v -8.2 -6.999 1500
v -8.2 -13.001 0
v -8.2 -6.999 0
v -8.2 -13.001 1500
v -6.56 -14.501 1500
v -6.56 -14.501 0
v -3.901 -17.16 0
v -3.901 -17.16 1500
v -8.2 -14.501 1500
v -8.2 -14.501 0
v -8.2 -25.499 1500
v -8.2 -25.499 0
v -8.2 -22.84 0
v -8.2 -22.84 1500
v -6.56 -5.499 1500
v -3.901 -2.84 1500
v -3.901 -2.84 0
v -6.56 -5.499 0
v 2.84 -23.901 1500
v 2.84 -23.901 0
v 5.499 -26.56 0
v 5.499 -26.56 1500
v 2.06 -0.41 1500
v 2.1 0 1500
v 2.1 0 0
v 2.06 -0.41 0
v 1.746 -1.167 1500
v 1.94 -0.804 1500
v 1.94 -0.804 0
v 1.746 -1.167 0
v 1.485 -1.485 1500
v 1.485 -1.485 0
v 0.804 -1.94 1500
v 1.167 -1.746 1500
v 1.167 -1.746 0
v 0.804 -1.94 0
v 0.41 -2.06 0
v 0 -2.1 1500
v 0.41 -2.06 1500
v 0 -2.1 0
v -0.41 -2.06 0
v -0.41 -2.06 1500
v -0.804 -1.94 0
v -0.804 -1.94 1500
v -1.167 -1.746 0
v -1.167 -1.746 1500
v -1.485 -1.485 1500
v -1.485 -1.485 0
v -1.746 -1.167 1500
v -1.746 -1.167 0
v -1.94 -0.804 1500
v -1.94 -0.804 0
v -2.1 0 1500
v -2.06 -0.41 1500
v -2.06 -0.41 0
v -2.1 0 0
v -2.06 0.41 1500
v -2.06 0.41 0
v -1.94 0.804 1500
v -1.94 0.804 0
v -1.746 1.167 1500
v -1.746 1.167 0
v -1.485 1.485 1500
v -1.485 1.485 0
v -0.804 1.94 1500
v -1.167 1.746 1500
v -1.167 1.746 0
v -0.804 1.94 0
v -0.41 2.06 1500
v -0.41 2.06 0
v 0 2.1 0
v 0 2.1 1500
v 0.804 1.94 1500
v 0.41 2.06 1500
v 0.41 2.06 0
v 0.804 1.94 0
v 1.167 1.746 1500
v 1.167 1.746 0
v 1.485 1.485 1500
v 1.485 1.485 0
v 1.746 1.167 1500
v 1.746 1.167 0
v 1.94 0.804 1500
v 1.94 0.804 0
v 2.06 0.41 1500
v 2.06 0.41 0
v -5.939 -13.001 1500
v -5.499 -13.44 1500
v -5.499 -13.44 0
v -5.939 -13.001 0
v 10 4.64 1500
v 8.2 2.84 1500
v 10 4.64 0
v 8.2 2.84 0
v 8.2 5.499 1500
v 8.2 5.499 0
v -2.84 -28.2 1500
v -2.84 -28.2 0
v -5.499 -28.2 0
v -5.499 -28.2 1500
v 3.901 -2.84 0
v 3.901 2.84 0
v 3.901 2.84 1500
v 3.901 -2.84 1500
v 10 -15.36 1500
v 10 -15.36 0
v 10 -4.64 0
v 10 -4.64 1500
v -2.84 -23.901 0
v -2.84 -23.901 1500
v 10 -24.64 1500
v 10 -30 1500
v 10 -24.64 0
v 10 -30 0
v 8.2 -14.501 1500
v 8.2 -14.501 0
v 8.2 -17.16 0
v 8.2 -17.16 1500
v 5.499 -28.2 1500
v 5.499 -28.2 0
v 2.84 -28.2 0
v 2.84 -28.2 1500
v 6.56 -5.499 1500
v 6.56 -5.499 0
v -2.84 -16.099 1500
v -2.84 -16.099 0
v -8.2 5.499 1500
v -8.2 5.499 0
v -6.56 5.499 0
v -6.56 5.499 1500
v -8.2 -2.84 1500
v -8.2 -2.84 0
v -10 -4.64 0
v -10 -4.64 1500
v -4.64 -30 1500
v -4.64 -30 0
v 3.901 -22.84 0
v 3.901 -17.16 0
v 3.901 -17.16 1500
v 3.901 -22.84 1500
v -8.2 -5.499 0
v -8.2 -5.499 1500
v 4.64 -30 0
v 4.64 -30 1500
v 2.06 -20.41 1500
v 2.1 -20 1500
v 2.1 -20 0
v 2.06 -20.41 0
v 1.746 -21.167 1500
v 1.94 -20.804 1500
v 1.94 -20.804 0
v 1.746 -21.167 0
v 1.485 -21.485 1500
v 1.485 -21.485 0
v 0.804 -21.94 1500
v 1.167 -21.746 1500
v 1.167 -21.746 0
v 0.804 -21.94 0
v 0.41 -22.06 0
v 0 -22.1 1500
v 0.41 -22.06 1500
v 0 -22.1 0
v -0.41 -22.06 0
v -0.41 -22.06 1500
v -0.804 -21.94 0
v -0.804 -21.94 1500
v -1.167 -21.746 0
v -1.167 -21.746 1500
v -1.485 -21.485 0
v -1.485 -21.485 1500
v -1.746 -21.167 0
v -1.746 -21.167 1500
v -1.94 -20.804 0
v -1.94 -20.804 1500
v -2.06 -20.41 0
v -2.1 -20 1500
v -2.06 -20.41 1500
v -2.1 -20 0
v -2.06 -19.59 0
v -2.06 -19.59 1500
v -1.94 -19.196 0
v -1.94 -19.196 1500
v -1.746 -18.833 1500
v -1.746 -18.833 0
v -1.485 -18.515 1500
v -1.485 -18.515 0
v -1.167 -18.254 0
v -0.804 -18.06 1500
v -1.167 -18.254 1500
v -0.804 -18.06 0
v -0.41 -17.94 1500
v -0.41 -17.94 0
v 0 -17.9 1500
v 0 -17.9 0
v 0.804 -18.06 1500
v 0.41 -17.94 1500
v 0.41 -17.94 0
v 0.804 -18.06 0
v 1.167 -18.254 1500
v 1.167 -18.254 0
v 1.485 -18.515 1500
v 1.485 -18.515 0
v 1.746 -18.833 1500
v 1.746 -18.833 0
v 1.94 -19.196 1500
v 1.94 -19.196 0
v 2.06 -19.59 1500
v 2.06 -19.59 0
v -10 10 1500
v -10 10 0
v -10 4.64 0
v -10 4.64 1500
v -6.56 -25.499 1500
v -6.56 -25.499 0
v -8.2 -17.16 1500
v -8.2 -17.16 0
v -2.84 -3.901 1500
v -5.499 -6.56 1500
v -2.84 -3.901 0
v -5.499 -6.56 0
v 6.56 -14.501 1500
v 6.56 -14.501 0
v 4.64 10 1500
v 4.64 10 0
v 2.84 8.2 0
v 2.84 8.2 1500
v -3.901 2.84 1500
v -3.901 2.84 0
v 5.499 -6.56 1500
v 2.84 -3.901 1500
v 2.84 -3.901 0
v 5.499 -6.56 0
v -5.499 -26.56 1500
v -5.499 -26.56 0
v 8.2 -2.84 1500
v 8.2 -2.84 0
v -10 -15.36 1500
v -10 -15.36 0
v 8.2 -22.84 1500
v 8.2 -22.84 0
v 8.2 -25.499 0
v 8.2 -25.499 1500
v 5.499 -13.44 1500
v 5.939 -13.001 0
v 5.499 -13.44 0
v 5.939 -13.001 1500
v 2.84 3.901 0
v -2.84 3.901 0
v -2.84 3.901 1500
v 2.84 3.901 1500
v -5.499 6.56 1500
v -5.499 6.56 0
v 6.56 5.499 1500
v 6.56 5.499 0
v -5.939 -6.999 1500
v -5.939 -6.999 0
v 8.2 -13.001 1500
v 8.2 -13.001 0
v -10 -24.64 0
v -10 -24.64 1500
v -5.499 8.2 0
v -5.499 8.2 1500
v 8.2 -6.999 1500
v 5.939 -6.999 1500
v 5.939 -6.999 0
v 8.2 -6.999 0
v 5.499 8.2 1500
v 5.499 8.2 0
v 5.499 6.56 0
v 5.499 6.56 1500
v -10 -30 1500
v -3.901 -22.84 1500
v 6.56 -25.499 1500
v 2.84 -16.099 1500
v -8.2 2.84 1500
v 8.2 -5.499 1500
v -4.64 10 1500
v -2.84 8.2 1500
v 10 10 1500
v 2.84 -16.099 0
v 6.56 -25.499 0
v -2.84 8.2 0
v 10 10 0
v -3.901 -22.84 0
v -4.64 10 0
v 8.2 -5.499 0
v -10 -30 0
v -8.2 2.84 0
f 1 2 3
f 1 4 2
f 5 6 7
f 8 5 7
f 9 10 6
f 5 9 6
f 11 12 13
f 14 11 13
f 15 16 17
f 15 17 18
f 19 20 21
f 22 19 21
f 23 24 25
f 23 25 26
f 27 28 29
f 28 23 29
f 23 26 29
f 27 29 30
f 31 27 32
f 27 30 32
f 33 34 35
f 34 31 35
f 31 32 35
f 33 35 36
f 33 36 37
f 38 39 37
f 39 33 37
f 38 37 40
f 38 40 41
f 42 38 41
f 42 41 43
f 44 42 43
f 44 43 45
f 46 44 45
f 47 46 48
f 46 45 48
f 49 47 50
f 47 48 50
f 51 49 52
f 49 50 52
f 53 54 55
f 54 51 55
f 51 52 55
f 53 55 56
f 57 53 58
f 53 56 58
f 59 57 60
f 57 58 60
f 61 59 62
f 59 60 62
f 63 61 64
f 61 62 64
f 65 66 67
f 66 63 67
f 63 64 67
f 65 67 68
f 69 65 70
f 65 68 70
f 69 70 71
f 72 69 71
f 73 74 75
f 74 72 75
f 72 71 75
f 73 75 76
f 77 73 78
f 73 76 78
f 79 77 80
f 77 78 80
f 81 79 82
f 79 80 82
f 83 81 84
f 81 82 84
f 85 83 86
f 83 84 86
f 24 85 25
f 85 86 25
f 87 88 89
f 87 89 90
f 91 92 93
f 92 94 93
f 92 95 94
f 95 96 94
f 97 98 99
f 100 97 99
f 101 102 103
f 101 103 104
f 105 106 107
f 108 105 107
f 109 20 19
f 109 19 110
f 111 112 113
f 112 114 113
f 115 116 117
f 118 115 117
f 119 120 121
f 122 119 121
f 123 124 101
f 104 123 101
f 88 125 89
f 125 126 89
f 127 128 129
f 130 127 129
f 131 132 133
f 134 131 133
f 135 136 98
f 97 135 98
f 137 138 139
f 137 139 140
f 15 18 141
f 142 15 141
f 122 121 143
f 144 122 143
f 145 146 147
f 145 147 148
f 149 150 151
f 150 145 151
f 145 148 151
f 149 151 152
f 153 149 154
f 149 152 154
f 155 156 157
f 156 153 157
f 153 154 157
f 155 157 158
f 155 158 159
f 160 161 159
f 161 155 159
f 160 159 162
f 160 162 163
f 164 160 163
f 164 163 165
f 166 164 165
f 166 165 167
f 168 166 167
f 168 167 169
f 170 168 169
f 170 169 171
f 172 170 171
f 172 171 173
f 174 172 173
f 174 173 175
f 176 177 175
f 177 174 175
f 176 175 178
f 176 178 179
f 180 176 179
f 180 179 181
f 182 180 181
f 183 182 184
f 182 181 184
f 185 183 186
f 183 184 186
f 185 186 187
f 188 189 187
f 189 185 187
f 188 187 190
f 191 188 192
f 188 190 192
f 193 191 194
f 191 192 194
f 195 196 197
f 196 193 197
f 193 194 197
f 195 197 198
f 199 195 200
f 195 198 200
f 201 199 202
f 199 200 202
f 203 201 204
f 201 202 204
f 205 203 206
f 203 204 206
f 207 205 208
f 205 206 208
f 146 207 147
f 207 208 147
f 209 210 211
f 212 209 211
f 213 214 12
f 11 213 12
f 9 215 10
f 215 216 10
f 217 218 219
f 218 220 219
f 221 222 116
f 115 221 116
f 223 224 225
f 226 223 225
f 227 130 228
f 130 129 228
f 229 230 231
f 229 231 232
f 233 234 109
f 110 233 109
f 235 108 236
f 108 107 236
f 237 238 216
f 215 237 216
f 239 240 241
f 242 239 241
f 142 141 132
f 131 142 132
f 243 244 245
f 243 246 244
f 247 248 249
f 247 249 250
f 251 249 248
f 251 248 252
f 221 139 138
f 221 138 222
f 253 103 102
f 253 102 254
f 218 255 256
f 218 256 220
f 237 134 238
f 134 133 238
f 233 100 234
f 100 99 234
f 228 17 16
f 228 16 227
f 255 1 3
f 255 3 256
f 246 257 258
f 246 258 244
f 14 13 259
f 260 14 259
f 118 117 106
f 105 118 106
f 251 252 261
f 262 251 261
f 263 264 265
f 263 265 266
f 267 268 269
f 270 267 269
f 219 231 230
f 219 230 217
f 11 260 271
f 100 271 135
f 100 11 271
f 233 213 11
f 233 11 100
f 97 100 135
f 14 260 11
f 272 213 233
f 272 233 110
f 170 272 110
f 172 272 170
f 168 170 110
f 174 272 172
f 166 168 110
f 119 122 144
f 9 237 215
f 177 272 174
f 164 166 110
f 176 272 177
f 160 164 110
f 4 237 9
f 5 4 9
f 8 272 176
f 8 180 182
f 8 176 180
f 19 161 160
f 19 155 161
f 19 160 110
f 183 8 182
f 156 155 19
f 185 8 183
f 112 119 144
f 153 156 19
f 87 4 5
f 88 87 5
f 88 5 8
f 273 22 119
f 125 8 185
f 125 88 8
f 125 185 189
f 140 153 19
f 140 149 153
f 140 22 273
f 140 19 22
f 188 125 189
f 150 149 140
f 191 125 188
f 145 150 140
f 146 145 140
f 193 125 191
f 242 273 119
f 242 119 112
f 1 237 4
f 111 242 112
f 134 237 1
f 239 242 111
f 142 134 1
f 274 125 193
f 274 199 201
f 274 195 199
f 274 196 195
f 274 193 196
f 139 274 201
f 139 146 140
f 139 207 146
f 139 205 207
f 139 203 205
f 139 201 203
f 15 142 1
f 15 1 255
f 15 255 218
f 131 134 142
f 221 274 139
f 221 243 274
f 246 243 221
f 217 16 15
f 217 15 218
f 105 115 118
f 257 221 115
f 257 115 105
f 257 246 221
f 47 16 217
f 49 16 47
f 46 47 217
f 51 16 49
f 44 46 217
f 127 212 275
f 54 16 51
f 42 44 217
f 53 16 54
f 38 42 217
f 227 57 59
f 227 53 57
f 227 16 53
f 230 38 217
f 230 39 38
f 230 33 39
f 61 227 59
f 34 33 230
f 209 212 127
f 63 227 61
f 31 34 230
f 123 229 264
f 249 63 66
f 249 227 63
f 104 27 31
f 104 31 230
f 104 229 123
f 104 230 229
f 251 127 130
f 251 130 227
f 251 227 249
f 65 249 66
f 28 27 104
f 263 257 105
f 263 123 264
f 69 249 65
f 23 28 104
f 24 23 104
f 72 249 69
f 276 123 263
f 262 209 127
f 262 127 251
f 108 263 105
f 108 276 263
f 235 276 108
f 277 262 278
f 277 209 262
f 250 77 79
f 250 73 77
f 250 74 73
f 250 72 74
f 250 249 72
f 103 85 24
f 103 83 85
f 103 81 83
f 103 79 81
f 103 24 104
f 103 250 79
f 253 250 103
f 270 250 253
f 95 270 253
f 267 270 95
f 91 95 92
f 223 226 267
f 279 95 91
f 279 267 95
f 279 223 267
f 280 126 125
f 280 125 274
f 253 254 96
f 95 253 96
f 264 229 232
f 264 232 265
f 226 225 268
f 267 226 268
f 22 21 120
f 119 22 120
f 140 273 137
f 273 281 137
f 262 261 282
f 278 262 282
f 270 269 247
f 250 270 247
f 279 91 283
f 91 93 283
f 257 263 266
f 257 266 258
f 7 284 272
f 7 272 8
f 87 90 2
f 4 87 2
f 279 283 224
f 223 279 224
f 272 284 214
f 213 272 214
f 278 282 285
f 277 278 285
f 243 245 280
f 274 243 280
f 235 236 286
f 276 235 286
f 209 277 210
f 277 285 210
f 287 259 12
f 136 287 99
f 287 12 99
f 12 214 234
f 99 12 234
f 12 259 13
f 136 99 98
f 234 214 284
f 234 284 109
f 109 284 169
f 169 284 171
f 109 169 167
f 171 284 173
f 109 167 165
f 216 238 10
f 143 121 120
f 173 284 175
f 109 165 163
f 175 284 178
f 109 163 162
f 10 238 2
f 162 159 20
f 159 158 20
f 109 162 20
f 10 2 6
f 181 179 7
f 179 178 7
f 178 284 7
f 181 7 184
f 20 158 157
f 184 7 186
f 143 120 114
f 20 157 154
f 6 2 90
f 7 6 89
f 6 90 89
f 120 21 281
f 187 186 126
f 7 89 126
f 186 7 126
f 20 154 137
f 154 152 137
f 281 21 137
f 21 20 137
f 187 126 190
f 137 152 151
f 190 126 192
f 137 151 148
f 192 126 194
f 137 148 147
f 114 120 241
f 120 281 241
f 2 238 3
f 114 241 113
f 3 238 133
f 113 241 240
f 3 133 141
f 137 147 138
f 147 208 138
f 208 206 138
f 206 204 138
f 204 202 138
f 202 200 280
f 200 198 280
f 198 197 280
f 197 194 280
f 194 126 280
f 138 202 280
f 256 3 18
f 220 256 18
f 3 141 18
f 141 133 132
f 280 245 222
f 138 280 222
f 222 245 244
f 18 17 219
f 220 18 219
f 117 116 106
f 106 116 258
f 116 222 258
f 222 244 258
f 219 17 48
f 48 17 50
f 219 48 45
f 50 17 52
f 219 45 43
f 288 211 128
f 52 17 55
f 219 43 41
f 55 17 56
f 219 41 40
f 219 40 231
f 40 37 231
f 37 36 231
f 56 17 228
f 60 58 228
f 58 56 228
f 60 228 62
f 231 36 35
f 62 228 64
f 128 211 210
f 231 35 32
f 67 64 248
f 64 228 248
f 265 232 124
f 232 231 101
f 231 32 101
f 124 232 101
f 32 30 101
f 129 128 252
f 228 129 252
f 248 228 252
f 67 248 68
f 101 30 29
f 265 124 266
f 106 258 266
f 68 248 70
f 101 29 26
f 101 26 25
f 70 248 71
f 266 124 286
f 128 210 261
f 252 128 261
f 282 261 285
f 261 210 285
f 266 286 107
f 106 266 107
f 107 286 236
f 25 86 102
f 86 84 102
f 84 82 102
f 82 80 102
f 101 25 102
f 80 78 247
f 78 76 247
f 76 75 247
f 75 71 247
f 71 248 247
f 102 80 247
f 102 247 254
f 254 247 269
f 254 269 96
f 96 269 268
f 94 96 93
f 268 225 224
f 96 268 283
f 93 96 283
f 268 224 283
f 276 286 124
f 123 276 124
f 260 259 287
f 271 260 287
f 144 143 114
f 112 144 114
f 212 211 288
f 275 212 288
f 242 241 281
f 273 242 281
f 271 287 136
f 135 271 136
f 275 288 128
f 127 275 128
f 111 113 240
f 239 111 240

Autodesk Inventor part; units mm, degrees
ref_plane "YZ Plane" through (0, 0, 0) normal (1, 0, 0) x (0, 1, 0)
ref_plane "XZ Plane" through (0, 0, 0) normal (0, 1, 0) x (-1, 0, 0)
ref_plane "XY Plane" through (0, 0, 0) normal (0, 0, 1) x (1, 0, 0)
sketch "Sketch1" plane through (0, 0, 0) normal (0, 0, 1) x (1, 0, 0)
  line L0 (-3.9007, 3.9007) -> (3.9007, 3.9007)
  line L1 (3.9007, 3.9007) -> (3.9007, -3.9007)
  line L2 (3.9007, -3.9007) -> (-3.9007, -3.9007)
  line L3 (-3.9007, -3.9007) -> (-3.9007, 3.9007)
  line L4 (0, 3.9007) -> (0, -3.9007) construction
  line L5 (-3.9007, 0) -> (3.9007, 0) construction
  circle A0 centre (0, 0) radius 2.1
  line L6 (0, 0) -> (-16.1173, 16.1173) construction
  line L7 (0, 0) -> (22.7933, 0) construction
  line L8 (-2.84, 3.9007) -> (-5.4993, 6.56)
  line L9 (-5.4993, 6.56) -> (-5.4993, 8.2)
  line L10 (-5.4993, 8.2) -> (-2.84, 8.2)
  line L11 (-2.84, 8.2) -> (-4.64, 10)
  line L12 (-4.64, 10) -> (-10, 10)
  line L13 (-10, 10) -> (-10, 4.64)
  line L14 (-10, 4.64) -> (-8.2, 2.84)
  line L15 (-8.2, 2.84) -> (-8.2, 5.4993)
  line L16 (-8.2, 5.4993) -> (-6.56, 5.4993)
  line L17 (-6.56, 5.4993) -> (-3.9007, 2.84)
  line L18 (-3.9007, 2.84) -> (-11.3102, 2.84) construction
  line L19 (-2.84, 3.9007) -> (-3.9007, 3.9007)
  line L20 (-3.9007, 2.84) -> (-3.9007, 3.9007)
  line L21 (-3.9007, -2.84) -> (-6.56, -5.4993)
  line L22 (-6.56, -5.4993) -> (-8.2, -5.4993)
  line L23 (-8.2, -5.4993) -> (-8.2, -2.84)
  line L24 (-8.2, -2.84) -> (-10, -4.64)
  line L25 (-10, -4.64) -> (-10, -10)
  line L26 (-10, -10) -> (-4.64, -10)
  line L27 (-4.64, -10) -> (-2.84, -8.2)
  line L28 (-2.84, -8.2) -> (-5.4993, -8.2)
  line L29 (-5.4993, -8.2) -> (-5.4993, -6.56)
  line L30 (-5.4993, -6.56) -> (-2.84, -3.9007)
  line L31 (-3.9007, -2.84) -> (-3.9007, -3.9007)
  line L32 (-2.84, -3.9007) -> (-3.9007, -3.9007)
  line L33 (2.84, -3.9007) -> (5.4993, -6.56)
  line L34 (5.4993, -6.56) -> (5.4993, -8.2)
  line L35 (5.4993, -8.2) -> (2.84, -8.2)
  line L36 (2.84, -8.2) -> (4.64, -10)
  line L37 (4.64, -10) -> (10, -10)
  line L38 (10, -10) -> (10, -4.64)
  line L39 (10, -4.64) -> (8.2, -2.84)
  line L40 (8.2, -2.84) -> (8.2, -5.4993)
  line L41 (8.2, -5.4993) -> (6.56, -5.4993)
  line L42 (6.56, -5.4993) -> (3.9007, -2.84)
  line L43 (2.84, -3.9007) -> (3.9007, -3.9007)
  line L44 (3.9007, -2.84) -> (3.9007, -3.9007)
  line L45 (3.9007, 2.84) -> (6.56, 5.4993)
  line L46 (6.56, 5.4993) -> (8.2, 5.4993)
  line L47 (8.2, 5.4993) -> (8.2, 2.84)
  line L48 (8.2, 2.84) -> (10, 4.64)
  line L49 (10, 4.64) -> (10, 10)
  line L50 (10, 10) -> (4.64, 10)
  line L51 (4.64, 10) -> (2.84, 8.2)
  line L52 (2.84, 8.2) -> (5.4993, 8.2)
  line L53 (5.4993, 8.2) -> (5.4993, 6.56)
  line L54 (5.4993, 6.56) -> (2.84, 3.9007)
  line L55 (3.9007, 2.84) -> (3.9007, 3.9007)
  line L56 (2.84, 3.9007) -> (3.9007, 3.9007)
  dimension "d7" = 4.2
  dimension "d8" = 135
  dimension "d9" = 1.5
  dimension "d10" = 1.64
  dimension "d11" = 1.8
  dimension "d12" = 2.84
  dimension "d13" = 10
  dimension "d16" = 360
extrude "Extrusion1" add sketch "Sketch1" along normal blind 1500
pattern_linear "Rectangular Pattern1" count 2 spacing 20 along (0, -1, 0) of "Extrusion1"
sketch "Sketch2" plane through (0, 0, 1500) normal (0, 0, 1) x (1, 0, 0)
  line L0 (8.2, -2.84) -> (8.2, -5.4993) projected
  line L1 (8.2, -5.4993) -> (6.56, -5.4993) projected
  line L2 (-6.56, -5.4993) -> (-8.2, -5.4993) projected
  line L3 (-8.2, -5.4993) -> (-8.2, -2.84) projected
  line L4 (-8.2, -14.5007) -> (-6.56, -14.5007) projected
  line L5 (6.56, -14.5007) -> (8.2, -14.5007) projected
  line L6 (5.4993, -11.8) -> (5.4993, -13.44) projected
  line L7 (5.4993, -13.44) -> (2.84, -16.0993) projected
  line L8 (-2.84, -16.0993) -> (-5.4993, -13.44) projected
  line L9 (-5.4993, -8.2) -> (-5.4993, -6.56) projected
  line L10 (-5.4993, -6.56) -> (-2.84, -3.9007) projected
  line L11 (2.84, -3.9007) -> (5.4993, -6.56) projected
  line L12 (2.84, -8.2) -> (4.64, -10) projected
  line L13 (-8.2, -6.9993) -> (-5.9387, -6.9993)
  line L14 (-5.9387, -6.9993) -> (-4.1231, -5.1837)
  line L15 (-4.1231, -5.1837) -> (4.1231, -5.1837)
  line L16 (4.1231, -5.1837) -> (5.9387, -6.9993)
  line L17 (5.9387, -6.9993) -> (8.2, -6.9993)
  line L18 (8.2, -6.9993) -> (8.2, -13.0007)
  line L19 (8.2, -13.0007) -> (5.9387, -13.0007)
  line L20 (5.9387, -13.0007) -> (4.2461, -14.6932)
  line L21 (4.2461, -14.6932) -> (-4.2461, -14.6932)
  line L22 (-4.2461, -14.6932) -> (-5.9387, -13.0007)
  line L23 (-5.9387, -13.0007) -> (-8.2, -13.0007)
  line L24 (-8.2, -13.0007) -> (-8.2, -6.9993)
  dimension "d23" = 1.5
  dimension "d24" = 1.5
  dimension "d25" = 1.5
  dimension "d26" = 1.5
extrude "Extrusion2" cut sketch "Sketch2" against normal up to next
equation "\"d24\" = d23"
equation "\"d25\" = d23"
equation "\"d26\" = d23"
properties part number "20x40x1500mm"
